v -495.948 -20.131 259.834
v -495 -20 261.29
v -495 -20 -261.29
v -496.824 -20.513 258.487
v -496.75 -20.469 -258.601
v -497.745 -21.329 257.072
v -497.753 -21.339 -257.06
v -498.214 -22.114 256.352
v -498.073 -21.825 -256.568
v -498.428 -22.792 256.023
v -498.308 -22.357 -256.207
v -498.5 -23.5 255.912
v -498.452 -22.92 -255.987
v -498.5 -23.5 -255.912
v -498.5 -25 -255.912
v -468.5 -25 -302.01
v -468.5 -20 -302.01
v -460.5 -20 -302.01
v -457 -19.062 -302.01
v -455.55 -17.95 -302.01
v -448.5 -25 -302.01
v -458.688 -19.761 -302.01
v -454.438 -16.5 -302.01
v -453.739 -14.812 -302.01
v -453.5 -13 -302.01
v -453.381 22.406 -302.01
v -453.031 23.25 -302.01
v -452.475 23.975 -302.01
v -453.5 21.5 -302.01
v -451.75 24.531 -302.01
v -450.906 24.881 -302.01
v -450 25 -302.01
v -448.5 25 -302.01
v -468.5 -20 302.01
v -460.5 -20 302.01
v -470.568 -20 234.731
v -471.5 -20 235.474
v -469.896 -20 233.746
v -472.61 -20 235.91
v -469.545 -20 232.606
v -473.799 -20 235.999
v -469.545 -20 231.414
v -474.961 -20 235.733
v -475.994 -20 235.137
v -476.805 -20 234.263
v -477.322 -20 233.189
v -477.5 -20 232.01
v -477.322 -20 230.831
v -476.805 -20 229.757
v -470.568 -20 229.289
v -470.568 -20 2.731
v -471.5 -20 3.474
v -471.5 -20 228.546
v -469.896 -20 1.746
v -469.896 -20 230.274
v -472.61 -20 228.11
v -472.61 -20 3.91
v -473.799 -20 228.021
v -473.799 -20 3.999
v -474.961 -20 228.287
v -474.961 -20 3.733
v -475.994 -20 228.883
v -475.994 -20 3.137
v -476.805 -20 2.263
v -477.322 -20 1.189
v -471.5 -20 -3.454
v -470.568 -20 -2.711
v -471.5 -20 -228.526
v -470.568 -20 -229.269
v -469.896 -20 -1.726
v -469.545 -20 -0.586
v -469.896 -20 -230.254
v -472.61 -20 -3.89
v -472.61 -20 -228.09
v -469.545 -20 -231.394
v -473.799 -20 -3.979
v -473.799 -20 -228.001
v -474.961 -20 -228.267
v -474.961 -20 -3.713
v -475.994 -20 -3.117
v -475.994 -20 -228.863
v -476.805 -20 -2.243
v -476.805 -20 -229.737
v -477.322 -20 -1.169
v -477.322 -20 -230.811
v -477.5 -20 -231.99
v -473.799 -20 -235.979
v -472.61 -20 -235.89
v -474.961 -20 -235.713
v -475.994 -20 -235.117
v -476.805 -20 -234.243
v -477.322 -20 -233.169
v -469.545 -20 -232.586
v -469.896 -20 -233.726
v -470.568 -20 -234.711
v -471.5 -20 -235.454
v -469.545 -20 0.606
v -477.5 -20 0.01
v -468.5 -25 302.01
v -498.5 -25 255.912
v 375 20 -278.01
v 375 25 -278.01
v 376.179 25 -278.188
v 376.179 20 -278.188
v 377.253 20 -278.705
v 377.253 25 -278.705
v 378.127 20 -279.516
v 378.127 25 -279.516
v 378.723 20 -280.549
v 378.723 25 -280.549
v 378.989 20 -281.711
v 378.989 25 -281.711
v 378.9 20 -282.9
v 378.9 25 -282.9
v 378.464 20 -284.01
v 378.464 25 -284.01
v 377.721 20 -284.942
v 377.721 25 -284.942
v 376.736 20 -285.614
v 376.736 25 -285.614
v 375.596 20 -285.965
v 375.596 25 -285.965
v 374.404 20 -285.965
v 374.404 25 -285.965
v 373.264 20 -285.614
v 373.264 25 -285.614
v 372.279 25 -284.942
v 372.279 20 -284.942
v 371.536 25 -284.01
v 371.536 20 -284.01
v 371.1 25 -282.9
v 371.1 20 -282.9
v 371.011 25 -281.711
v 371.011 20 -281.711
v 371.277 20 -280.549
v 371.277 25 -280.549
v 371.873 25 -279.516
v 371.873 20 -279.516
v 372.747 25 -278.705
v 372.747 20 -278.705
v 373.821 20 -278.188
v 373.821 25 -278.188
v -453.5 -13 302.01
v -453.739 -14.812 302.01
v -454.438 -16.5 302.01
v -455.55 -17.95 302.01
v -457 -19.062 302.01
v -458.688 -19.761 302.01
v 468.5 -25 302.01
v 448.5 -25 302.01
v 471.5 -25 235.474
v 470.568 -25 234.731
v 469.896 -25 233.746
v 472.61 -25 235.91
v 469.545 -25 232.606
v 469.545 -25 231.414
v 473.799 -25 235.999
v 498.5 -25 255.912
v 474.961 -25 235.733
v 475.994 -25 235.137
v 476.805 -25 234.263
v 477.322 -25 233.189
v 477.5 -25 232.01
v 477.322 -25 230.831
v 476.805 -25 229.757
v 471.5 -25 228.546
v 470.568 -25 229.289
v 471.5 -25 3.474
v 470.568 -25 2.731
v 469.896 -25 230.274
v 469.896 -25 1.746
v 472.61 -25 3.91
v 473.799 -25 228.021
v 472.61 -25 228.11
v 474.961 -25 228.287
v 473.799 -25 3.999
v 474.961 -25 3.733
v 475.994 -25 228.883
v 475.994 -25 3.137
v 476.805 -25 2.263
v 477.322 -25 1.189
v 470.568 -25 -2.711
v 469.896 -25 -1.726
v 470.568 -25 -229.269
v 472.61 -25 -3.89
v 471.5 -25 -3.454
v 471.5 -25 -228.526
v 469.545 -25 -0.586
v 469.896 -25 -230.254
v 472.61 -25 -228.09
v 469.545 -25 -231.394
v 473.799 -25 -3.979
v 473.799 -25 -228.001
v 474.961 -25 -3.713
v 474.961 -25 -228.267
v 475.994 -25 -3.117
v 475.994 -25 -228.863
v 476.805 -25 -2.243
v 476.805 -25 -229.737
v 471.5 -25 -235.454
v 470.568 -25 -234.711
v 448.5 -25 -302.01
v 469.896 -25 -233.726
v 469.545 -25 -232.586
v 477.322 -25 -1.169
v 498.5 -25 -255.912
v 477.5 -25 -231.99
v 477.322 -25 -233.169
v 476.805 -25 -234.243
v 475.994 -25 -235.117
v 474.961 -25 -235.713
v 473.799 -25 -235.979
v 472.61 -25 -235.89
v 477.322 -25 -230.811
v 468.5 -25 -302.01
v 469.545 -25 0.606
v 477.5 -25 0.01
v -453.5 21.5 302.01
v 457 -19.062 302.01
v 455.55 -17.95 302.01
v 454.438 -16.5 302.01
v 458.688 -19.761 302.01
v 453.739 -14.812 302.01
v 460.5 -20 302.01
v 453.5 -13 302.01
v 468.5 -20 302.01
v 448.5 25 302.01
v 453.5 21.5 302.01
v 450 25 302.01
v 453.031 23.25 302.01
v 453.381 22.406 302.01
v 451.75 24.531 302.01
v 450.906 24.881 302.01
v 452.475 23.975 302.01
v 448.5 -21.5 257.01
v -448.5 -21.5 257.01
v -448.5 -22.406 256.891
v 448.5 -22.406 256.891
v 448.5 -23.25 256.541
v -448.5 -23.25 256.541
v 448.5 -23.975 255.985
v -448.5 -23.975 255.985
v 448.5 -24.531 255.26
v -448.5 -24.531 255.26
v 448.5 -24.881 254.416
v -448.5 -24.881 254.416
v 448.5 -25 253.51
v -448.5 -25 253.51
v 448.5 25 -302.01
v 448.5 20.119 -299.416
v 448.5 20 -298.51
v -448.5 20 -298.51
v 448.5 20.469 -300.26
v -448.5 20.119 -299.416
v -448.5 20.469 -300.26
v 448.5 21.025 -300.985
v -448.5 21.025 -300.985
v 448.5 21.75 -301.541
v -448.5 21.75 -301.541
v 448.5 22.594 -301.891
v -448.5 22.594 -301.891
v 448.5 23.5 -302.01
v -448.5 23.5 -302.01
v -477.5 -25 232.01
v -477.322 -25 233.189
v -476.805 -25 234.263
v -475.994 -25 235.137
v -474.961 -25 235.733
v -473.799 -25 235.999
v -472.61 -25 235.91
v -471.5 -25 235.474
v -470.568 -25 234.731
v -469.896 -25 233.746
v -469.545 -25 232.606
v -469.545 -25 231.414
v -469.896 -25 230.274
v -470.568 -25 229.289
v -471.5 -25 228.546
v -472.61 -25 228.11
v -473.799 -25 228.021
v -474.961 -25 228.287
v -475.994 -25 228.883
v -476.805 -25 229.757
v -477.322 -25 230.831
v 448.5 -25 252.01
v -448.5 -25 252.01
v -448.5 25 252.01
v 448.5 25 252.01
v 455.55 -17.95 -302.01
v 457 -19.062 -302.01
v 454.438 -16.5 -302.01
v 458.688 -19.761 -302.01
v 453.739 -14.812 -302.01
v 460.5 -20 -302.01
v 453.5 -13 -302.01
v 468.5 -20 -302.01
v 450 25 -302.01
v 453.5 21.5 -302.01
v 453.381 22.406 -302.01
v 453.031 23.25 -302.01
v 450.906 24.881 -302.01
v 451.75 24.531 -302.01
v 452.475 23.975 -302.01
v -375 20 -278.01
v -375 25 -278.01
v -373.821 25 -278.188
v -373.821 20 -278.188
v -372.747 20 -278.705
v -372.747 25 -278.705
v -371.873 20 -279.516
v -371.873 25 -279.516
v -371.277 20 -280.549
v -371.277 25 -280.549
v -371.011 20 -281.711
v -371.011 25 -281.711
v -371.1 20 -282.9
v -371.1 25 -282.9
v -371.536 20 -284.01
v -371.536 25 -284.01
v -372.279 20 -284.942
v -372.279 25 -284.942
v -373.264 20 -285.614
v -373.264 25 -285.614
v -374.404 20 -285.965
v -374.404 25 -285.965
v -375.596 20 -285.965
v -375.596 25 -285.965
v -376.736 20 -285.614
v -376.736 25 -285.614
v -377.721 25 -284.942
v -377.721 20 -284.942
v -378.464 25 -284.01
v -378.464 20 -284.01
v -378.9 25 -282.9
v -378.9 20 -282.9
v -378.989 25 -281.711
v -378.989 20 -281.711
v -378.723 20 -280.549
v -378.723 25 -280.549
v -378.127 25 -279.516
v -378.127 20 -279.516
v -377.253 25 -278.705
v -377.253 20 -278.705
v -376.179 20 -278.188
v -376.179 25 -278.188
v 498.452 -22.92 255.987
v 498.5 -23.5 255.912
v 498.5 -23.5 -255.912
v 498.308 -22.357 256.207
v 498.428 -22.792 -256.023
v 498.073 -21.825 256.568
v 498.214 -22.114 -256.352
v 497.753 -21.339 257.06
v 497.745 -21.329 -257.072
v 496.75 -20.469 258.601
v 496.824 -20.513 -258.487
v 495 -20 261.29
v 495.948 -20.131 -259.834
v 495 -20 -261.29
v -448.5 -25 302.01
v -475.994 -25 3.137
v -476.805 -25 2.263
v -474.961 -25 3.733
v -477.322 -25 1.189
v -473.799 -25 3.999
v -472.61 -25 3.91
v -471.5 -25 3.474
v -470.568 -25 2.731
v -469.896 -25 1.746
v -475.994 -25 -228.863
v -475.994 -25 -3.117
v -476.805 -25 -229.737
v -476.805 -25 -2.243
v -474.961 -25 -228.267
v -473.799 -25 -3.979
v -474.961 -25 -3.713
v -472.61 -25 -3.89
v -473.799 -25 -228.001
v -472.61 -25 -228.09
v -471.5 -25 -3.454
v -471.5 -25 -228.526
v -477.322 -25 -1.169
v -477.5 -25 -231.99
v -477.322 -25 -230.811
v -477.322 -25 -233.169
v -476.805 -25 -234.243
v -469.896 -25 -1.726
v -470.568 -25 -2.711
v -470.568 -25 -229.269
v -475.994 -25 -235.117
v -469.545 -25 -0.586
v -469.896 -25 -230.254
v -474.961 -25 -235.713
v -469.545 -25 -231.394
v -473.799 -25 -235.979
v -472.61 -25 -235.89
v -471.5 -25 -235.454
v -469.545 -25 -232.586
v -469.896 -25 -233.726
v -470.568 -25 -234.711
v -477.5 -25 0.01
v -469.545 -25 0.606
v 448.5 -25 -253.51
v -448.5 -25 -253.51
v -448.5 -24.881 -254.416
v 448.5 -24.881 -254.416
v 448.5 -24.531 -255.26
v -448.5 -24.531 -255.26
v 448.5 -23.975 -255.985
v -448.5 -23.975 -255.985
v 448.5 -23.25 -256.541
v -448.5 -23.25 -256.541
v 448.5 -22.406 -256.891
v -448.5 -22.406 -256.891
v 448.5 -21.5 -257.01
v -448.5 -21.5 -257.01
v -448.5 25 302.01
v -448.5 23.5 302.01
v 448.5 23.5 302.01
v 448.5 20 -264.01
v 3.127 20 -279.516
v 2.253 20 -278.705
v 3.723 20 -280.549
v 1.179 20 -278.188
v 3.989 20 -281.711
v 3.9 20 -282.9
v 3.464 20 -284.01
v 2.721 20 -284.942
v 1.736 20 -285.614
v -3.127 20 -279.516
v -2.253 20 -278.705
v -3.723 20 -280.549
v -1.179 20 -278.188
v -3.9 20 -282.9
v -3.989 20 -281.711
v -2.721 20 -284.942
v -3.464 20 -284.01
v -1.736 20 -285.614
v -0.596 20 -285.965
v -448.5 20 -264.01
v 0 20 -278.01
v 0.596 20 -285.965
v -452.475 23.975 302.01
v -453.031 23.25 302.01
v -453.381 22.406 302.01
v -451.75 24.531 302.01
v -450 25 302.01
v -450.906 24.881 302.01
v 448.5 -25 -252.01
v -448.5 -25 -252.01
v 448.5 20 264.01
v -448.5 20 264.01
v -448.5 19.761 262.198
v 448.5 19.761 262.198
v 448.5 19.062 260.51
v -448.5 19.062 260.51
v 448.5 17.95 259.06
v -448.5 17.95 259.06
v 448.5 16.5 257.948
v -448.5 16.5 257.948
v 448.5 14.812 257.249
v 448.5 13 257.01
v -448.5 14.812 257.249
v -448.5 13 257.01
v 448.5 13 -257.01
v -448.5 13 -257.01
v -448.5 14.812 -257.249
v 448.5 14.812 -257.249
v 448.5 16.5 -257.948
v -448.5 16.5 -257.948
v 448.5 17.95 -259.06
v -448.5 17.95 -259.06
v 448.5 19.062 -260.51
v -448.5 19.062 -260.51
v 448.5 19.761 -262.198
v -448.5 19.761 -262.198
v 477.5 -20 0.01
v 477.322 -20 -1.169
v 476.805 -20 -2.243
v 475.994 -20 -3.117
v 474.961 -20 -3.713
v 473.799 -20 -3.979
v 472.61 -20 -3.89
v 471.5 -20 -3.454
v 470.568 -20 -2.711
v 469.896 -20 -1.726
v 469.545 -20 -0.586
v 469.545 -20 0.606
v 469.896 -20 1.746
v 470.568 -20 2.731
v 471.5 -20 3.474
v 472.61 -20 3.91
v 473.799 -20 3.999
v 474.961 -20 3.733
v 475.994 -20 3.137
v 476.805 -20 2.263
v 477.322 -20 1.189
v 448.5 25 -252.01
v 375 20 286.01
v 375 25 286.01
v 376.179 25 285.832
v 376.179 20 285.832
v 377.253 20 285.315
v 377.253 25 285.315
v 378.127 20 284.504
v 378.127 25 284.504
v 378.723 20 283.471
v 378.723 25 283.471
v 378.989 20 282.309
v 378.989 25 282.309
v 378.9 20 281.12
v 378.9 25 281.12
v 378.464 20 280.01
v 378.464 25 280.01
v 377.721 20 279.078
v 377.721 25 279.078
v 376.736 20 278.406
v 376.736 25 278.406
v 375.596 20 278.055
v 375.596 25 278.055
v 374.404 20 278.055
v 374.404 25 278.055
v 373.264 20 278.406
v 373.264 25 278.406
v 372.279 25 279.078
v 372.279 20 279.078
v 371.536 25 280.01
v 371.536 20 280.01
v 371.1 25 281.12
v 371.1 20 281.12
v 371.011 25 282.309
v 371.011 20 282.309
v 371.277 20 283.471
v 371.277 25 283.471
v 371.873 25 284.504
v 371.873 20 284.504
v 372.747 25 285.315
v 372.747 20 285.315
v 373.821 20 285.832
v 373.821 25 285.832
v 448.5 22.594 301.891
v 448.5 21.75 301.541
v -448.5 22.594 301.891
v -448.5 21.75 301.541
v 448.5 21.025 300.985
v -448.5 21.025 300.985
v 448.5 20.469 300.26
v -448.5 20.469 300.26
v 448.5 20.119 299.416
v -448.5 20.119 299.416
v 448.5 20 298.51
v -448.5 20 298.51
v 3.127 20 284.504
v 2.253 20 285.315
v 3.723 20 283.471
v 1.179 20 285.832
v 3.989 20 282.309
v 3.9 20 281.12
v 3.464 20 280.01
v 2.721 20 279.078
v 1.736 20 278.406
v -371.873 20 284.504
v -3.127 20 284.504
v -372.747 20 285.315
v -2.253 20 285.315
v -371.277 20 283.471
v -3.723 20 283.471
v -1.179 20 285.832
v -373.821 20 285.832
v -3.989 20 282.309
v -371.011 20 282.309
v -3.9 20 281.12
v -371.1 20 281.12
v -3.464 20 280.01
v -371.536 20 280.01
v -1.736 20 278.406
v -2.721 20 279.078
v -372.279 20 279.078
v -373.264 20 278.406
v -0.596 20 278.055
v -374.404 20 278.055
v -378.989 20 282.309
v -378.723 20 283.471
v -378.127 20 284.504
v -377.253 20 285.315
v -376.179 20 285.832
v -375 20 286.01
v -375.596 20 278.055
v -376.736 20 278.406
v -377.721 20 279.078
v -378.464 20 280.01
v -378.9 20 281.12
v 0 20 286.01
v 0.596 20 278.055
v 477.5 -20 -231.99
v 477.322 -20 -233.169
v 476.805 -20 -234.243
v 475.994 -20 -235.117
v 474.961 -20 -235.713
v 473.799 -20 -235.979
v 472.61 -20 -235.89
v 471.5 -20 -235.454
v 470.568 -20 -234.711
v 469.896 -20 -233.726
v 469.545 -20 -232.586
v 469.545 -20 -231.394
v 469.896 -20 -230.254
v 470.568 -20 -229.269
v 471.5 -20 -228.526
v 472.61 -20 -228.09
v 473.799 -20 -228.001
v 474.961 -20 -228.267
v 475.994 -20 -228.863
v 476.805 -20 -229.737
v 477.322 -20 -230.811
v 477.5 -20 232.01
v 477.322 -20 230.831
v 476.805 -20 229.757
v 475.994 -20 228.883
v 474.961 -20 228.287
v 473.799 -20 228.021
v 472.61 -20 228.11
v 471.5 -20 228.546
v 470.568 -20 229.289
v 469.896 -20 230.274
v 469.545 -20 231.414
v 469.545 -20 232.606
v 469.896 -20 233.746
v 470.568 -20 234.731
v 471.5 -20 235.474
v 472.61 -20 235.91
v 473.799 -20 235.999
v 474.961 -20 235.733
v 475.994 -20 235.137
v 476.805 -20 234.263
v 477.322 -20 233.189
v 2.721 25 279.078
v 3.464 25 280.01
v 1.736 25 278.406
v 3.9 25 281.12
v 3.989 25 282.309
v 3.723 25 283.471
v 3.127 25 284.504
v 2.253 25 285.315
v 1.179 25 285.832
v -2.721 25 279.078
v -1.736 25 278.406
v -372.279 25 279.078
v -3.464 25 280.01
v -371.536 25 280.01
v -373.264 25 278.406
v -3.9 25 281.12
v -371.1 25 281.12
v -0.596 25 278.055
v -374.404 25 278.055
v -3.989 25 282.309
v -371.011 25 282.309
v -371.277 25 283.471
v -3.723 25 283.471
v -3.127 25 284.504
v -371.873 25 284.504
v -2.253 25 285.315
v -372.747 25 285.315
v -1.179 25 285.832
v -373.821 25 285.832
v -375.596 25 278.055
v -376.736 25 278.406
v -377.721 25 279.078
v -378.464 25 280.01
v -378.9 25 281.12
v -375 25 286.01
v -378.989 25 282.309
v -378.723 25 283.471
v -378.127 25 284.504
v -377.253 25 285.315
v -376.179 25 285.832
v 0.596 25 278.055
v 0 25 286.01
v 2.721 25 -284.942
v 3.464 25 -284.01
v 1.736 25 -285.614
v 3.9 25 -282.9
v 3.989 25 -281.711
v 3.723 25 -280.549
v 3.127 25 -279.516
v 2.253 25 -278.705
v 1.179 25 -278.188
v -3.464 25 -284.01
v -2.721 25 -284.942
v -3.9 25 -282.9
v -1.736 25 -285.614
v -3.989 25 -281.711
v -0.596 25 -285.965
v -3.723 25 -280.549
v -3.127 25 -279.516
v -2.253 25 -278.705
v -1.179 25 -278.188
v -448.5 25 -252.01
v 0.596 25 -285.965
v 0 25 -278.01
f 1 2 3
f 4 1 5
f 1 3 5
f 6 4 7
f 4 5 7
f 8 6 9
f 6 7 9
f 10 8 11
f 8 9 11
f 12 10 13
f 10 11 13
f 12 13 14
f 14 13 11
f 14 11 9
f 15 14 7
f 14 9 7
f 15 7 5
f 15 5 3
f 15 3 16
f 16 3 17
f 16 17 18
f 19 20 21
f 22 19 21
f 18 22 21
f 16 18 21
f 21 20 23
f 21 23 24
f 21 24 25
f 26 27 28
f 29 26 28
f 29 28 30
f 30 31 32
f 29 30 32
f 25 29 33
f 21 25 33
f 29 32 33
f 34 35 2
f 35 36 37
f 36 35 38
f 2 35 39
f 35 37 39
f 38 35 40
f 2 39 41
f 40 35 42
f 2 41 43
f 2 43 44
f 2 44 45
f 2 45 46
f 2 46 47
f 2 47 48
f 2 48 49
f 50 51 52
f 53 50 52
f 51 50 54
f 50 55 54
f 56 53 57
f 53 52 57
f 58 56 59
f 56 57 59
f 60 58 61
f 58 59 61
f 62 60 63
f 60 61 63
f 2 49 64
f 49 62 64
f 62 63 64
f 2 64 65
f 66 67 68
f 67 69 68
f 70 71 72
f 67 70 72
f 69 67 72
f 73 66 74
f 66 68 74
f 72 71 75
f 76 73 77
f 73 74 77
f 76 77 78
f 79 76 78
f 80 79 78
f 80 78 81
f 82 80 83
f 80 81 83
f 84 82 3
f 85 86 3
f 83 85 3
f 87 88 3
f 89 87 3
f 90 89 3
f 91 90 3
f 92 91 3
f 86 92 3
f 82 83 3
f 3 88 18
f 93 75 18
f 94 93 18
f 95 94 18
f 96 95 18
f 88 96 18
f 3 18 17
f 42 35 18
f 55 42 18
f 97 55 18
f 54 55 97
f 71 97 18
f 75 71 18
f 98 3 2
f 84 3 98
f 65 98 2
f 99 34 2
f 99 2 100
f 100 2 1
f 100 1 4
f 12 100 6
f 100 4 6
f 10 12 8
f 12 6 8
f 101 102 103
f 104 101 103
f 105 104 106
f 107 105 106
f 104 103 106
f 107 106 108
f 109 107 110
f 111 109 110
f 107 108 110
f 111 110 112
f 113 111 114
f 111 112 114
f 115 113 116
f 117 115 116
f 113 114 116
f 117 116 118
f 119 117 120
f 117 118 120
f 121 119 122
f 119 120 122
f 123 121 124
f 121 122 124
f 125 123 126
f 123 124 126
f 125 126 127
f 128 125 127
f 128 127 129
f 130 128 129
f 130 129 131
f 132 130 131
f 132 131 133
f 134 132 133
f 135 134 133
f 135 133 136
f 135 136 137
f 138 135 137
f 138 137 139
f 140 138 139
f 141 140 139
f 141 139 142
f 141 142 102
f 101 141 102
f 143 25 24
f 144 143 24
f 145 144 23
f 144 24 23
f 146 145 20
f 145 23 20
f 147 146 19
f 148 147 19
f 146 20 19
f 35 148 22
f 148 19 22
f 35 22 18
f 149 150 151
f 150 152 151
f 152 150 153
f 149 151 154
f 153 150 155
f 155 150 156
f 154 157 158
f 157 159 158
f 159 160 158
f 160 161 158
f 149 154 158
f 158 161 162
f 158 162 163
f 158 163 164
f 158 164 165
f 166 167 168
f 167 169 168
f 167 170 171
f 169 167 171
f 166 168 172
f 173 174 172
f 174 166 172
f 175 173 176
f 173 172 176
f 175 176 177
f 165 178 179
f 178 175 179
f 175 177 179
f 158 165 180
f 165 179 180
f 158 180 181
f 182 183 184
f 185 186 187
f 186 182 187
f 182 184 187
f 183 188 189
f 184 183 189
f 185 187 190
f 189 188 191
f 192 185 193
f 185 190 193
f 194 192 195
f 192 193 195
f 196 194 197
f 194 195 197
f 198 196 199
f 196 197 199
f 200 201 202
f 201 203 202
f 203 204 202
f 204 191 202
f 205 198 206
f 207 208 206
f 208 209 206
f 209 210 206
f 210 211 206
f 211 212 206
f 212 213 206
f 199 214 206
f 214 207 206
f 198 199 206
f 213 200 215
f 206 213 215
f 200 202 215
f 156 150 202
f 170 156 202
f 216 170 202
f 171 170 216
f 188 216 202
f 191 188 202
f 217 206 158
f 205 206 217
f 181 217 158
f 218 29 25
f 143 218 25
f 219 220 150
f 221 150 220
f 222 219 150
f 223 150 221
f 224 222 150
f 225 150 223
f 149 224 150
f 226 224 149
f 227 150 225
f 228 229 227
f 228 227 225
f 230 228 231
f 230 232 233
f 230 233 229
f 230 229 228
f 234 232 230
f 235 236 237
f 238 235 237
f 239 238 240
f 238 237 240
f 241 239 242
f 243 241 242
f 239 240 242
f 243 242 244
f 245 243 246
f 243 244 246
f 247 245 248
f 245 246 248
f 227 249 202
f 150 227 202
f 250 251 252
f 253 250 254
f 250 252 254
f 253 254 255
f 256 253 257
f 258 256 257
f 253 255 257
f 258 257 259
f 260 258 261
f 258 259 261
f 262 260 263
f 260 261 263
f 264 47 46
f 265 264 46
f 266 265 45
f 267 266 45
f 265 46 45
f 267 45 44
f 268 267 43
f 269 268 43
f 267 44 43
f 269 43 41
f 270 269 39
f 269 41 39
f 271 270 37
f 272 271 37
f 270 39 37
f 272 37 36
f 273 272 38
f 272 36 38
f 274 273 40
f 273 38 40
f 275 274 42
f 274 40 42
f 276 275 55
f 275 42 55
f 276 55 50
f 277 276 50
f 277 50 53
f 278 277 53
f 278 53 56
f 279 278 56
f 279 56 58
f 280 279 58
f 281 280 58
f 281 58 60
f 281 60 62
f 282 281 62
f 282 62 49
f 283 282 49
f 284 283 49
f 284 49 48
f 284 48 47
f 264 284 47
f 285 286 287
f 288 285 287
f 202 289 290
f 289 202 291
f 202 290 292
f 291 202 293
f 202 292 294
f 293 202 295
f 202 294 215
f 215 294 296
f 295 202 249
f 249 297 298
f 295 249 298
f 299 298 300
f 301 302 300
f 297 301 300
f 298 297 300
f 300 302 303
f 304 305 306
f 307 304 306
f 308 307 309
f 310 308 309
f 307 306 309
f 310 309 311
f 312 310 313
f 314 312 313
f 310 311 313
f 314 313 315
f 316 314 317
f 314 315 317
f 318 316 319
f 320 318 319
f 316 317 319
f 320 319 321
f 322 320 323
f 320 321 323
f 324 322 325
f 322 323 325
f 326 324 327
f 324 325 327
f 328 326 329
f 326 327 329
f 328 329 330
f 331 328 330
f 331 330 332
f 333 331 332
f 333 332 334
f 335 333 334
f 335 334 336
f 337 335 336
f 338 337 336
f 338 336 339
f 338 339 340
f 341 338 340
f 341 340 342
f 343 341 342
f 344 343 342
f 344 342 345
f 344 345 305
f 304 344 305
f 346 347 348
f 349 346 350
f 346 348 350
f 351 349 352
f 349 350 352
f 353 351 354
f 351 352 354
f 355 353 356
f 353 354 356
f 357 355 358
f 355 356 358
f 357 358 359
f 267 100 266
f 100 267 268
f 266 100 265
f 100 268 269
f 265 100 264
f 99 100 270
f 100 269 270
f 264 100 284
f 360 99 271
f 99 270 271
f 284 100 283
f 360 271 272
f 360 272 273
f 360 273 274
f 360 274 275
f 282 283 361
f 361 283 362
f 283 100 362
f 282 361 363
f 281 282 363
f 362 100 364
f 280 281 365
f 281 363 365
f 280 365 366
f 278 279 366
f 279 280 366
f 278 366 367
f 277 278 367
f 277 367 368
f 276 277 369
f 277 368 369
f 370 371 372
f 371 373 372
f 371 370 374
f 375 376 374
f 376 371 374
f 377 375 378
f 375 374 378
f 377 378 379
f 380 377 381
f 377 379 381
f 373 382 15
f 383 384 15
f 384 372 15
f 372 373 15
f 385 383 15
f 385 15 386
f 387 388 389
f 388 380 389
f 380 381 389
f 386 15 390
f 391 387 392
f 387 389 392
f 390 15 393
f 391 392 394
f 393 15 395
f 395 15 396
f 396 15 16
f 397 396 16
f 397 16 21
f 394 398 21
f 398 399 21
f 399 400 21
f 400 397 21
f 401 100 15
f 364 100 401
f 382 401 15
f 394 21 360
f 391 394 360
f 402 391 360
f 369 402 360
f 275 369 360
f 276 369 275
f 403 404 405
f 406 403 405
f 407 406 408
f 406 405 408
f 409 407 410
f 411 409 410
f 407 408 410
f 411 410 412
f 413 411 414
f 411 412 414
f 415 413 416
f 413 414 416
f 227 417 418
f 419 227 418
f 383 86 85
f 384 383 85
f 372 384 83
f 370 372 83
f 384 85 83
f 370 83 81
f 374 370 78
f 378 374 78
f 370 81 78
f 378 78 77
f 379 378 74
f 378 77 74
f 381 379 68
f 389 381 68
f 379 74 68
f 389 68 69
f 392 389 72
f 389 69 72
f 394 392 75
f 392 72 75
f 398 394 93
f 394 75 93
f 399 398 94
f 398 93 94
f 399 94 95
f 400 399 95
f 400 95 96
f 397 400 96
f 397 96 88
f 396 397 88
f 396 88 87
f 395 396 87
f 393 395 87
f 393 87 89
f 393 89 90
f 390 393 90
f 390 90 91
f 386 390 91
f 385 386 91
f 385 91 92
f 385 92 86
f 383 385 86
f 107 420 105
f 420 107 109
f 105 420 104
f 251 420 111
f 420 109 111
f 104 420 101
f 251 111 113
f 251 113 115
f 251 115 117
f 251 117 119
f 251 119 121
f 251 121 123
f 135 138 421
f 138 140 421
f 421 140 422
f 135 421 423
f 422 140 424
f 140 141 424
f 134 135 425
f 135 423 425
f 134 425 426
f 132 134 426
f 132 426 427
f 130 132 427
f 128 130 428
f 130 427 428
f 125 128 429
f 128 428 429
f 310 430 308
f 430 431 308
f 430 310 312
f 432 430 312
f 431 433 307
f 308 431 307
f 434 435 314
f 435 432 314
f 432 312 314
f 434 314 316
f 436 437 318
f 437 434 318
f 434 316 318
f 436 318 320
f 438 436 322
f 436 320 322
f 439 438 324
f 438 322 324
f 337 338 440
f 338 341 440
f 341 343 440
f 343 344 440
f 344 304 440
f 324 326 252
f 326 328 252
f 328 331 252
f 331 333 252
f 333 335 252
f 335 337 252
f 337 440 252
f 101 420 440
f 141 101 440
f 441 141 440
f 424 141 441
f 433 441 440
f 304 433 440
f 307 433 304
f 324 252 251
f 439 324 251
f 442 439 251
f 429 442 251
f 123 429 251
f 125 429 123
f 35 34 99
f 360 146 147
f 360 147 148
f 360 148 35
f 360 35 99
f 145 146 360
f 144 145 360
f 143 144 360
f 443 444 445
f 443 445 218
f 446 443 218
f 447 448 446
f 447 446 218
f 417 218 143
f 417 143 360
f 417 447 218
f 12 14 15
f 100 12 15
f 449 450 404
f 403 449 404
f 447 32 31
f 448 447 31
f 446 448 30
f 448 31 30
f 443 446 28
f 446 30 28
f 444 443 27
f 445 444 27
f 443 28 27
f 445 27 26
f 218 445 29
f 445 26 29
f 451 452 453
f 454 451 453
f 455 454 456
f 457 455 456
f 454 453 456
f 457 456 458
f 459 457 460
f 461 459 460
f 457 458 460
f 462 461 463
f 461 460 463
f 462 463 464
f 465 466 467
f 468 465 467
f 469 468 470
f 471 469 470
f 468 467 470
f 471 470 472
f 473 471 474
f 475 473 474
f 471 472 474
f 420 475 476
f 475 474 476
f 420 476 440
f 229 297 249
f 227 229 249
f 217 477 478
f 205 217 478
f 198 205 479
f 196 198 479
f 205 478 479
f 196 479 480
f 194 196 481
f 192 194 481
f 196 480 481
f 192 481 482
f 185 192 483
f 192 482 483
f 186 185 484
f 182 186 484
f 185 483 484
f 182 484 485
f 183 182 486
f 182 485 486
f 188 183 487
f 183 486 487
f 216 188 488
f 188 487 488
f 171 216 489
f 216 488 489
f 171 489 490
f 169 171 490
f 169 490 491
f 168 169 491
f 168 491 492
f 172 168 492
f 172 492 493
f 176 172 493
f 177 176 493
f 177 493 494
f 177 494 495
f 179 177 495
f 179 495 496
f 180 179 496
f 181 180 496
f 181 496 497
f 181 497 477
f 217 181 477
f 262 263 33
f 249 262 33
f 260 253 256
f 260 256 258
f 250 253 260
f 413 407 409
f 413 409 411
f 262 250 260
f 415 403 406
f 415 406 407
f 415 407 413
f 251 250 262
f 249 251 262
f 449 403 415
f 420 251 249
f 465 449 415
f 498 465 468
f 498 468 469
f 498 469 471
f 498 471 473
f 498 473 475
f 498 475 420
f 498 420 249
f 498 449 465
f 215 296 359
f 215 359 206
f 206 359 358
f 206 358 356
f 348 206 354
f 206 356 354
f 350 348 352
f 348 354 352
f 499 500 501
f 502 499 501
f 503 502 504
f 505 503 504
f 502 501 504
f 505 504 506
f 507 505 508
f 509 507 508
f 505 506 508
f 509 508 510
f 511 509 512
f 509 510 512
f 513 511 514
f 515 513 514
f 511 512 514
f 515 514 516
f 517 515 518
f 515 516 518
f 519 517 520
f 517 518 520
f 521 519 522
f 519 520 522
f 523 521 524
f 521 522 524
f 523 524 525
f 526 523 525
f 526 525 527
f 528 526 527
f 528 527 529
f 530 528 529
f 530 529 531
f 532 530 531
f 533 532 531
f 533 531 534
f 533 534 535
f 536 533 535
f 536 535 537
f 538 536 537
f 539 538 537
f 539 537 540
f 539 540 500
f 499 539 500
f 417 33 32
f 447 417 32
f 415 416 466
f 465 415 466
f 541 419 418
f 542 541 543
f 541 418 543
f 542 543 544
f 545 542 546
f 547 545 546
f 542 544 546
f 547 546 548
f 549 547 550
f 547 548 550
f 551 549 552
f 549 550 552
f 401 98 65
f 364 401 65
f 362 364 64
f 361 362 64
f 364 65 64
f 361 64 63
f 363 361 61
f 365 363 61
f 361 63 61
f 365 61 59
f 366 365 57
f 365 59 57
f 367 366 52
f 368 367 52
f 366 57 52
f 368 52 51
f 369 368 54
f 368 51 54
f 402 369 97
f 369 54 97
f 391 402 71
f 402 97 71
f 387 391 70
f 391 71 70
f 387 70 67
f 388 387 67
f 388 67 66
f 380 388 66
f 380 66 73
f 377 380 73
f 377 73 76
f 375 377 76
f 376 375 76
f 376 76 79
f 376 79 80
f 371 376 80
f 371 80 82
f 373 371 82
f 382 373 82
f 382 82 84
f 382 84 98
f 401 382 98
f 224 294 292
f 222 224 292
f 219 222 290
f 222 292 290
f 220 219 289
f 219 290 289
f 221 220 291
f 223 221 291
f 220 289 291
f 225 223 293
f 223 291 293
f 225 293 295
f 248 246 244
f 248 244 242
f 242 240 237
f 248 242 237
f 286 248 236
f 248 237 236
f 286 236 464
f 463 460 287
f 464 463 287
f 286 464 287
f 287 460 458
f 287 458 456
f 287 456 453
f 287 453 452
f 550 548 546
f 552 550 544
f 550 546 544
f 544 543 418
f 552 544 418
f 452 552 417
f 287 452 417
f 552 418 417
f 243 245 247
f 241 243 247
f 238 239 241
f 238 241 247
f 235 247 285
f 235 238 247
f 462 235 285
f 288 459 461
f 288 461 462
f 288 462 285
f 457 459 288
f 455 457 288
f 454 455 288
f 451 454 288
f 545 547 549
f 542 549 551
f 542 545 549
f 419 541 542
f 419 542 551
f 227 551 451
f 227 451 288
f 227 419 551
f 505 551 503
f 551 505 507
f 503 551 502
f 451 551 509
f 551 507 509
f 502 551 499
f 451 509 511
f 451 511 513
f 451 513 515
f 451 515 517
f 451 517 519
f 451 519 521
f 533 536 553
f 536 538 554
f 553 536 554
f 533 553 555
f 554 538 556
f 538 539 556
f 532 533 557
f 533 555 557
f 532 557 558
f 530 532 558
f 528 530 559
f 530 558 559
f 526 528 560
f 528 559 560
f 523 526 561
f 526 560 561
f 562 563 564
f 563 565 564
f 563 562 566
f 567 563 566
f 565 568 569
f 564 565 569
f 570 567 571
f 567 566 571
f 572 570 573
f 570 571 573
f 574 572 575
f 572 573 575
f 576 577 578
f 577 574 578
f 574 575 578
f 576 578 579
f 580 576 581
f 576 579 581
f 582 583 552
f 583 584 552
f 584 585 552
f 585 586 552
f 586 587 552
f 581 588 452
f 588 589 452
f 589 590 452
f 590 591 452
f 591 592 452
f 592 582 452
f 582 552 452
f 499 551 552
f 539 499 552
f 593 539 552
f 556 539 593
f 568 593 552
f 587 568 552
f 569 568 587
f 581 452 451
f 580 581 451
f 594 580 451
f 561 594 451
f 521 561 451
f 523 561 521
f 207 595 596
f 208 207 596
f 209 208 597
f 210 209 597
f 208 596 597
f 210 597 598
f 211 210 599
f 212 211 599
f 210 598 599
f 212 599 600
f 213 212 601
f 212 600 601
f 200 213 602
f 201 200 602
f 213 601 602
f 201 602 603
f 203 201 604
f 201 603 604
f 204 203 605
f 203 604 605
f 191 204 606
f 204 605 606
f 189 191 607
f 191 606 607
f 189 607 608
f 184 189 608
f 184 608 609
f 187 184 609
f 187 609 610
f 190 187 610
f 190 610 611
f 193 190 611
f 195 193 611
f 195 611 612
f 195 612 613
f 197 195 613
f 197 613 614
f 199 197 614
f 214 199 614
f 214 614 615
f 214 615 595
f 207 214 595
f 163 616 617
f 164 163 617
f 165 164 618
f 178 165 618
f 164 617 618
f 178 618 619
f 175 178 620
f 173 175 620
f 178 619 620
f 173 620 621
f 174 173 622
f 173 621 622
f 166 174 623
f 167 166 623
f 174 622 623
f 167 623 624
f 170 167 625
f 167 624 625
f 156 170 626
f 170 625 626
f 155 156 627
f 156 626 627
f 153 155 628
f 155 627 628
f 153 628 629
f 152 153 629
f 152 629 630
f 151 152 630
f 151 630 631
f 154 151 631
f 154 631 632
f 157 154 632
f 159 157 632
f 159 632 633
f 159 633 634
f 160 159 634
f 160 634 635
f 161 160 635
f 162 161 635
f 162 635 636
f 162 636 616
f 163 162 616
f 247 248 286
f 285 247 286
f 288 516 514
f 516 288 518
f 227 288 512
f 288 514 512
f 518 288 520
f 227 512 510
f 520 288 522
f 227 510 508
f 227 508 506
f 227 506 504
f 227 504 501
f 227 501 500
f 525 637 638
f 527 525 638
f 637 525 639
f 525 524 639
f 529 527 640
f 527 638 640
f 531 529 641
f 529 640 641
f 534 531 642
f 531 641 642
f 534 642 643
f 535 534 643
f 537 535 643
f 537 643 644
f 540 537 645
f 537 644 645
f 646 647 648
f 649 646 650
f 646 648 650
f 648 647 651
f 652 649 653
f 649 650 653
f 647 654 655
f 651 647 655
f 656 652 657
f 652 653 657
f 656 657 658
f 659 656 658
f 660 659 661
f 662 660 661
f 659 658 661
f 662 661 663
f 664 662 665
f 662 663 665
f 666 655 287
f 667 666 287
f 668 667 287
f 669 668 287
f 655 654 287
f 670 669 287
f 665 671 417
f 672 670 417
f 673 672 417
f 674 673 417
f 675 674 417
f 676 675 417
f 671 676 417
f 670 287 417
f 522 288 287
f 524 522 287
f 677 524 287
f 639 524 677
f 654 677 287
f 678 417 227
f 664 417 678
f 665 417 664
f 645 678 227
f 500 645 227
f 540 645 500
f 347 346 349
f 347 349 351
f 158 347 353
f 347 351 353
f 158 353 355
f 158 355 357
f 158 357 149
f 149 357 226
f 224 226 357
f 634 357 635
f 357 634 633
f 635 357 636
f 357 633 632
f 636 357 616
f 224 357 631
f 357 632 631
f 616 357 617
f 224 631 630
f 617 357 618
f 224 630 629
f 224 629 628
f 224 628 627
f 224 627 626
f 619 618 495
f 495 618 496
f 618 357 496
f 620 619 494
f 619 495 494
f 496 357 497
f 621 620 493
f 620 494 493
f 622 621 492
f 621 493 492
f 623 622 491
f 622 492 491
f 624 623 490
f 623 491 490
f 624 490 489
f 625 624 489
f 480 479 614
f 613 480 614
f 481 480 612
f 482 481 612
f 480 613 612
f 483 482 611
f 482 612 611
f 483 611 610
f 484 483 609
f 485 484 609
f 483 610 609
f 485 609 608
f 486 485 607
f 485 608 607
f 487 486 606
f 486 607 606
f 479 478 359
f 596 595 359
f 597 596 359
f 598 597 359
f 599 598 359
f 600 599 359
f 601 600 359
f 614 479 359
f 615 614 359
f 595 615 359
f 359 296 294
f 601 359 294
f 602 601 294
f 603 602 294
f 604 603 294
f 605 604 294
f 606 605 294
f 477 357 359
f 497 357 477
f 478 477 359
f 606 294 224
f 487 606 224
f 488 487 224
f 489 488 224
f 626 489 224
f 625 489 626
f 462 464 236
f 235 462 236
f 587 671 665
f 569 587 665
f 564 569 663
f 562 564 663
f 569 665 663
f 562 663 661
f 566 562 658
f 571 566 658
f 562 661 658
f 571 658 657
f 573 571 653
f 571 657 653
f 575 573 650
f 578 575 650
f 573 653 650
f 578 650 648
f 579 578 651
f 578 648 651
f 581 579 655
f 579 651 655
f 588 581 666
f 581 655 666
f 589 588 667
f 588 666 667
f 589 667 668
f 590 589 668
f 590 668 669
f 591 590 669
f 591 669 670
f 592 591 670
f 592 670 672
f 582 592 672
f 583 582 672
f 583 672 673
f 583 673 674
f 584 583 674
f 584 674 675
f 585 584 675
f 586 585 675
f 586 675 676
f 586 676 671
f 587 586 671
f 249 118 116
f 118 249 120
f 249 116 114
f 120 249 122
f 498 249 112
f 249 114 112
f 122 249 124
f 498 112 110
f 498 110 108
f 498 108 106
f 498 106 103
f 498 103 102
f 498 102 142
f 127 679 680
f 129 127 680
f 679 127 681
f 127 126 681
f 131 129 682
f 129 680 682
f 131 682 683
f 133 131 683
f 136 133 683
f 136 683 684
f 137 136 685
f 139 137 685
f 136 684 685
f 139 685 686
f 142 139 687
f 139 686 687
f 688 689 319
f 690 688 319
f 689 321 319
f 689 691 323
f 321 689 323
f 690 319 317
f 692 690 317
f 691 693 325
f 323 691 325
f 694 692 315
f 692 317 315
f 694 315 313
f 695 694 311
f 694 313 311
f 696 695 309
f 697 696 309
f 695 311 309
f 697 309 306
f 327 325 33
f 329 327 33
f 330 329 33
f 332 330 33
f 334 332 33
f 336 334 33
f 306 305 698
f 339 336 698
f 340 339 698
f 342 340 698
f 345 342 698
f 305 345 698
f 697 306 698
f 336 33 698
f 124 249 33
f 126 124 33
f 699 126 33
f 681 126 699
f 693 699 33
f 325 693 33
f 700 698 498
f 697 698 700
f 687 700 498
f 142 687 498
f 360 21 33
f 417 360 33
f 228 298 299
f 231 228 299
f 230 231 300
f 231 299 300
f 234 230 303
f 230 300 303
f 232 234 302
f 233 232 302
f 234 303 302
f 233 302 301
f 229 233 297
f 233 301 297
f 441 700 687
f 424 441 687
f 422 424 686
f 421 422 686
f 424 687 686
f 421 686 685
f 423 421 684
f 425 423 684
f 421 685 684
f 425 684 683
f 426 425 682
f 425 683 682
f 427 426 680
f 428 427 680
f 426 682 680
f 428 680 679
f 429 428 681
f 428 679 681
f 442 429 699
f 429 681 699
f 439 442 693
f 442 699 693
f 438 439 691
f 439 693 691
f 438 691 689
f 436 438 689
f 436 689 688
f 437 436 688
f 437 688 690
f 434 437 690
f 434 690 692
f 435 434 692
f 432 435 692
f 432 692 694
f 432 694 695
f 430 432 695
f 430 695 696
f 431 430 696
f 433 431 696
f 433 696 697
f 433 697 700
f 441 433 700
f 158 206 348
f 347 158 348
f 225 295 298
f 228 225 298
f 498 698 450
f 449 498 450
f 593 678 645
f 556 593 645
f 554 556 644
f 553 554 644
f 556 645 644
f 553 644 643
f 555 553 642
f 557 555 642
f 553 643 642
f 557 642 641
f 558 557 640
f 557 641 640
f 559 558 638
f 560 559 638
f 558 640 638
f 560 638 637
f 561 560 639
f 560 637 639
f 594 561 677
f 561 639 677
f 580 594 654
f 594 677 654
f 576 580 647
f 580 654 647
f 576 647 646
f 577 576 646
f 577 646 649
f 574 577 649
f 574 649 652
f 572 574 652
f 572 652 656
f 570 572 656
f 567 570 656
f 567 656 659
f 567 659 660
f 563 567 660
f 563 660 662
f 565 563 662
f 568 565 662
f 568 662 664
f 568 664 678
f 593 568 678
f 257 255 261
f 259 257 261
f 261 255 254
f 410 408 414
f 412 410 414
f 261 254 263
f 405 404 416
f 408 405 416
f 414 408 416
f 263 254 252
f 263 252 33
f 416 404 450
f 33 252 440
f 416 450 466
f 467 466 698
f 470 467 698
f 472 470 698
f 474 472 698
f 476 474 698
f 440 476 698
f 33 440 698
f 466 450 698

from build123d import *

# Parameters (mm, degrees)
L_START                    = -448.5
L_ANGLE_L50X50X5_1_DEPTH   = 897
L_START_2                  = -302.01
L_ANGLE_L50X50X5_1_2_DEPTH = 604.02
CUT_EXTRUDE1_DEPTH         = 585.583005312
SKETCH13_R                 = 4
CUT_EXTRUDE2_DEPTH         = 585.583005312
SKETCH14_R                 = 4
CUT_EXTRUDE3_DEPTH         = 10


# Read off the part's stored shape, not the designer's step: L angle L50X50X5(1)
with BuildPart() as part:
    # L angle L50X50X5(1) outline → L angle L50X50X5(1) (new body)
    with BuildSketch(Plane.YZ.offset(L_START)):
        with BuildLine():
            Line((25, 252.01), (25, 302.01))
            Line((25, 302.01), (23.5, 302.01))
            ThreePointArc((23.5, 302.01), (21.025126266, 300.984873734), (20, 298.51))
            Line((20, 298.51), (20, 264.01))
            ThreePointArc((20, 264.01), (17.949747468, 259.060252532), (13, 257.01))
            Line((13, 257.01), (-21.5, 257.01))
            ThreePointArc((-21.5, 257.01), (-23.974873734, 255.984873734), (-25, 253.51))
            Line((-25, 253.51), (-25, 252.01))
            Line((-25, 252.01), (25, 252.01))
        make_face()
        with BuildLine():
            Line((25, -252.01), (-25, -252.01))
            Line((-25, -252.01), (-25, -253.51))
            ThreePointArc((-25, -253.51), (-23.974873734, -255.984873734), (-21.5, -257.01))
            Line((-21.5, -257.01), (13, -257.01))
            ThreePointArc((13, -257.01), (17.949747468, -259.060252532), (20, -264.01))
            Line((20, -264.01), (20, -298.51))
            ThreePointArc((20, -298.51), (21.025126266, -300.984873734), (23.5, -302.01))
            Line((23.5, -302.01), (25, -302.01))
            Line((25, -302.01), (25, -252.01))
        make_face()
    extrude(amount=L_ANGLE_L50X50X5_1_DEPTH)

    # Sketch14 → Cut-Extrude3 (cut)
    with BuildSketch(Plane(origin=(0, 25, 0), x_dir=(1, 0, 0), z_dir=(0, 1, 0))):
        with Locations(Location((375, 282.01, 0), (0, 0, 270))):
            Circle(SKETCH14_R)
        with Locations(Location((0, 282.01, 0), (0, 0, 270))):
            Circle(SKETCH14_R)
        with Locations(Location((-375, 282.01, 0), (0, 0, 270))):
            Circle(SKETCH14_R)
        with Locations(Location((-375, -282.01, 0), (0, 0, 270))):
            Circle(SKETCH14_R)
        with Locations(Location((0, -282.01, 0), (0, 0, 270))):
            Circle(SKETCH14_R)
        with Locations(Location((375, -282.01, 0), (0, 0, 270))):
            Circle(SKETCH14_R)
    extrude(amount=-CUT_EXTRUDE3_DEPTH, mode=Mode.SUBTRACT)


with BuildPart() as body_2:
    # L angle L50X50X5_1 2 outline → L angle L50X50X5_1 2 (new body)
    with BuildSketch(Plane.XY.offset(L_START_2)):
        with BuildLine():
            Line((448.5, -25), (498.5, -25))
            Line((498.5, -25), (498.5, -23.5))
            ThreePointArc((498.5, -23.5), (497.474873734, -21.025126266), (495, -20))
            Line((495, -20), (460.5, -20))
            ThreePointArc((460.5, -20), (455.550252532, -17.949747468), (453.5, -13))
            Line((453.5, -13), (453.5, 21.5))
            ThreePointArc((453.5, 21.5), (452.474873734, 23.974873734), (450, 25))
            Line((450, 25), (448.5, 25))
            Line((448.5, 25), (448.5, -25))
        make_face()
        with BuildLine():
            Line((-448.5, -25), (-448.5, 25))
            Line((-448.5, 25), (-450, 25))
            ThreePointArc((-450, 25), (-452.474873734, 23.974873734), (-453.5, 21.5))
            Line((-453.5, 21.5), (-453.5, -13))
            ThreePointArc((-453.5, -13), (-455.550252532, -17.949747468), (-460.5, -20))
            Line((-460.5, -20), (-495, -20))
            ThreePointArc((-495, -20), (-497.474873734, -21.025126266), (-498.5, -23.5))
            Line((-498.5, -23.5), (-498.5, -25))
            Line((-498.5, -25), (-448.5, -25))
        make_face()
    extrude(amount=L_ANGLE_L50X50X5_1_2_DEPTH)

    # Sketch12 → Cut-Extrude1 (cut, through all)
    with BuildSketch(Plane(origin=(0, -20, 0), x_dir=(1, 0, 0), z_dir=(0, 1, 0))):
        Polygon((-468.5, -302.01), (-500.831260031, -252.33008513), (-500.831260031, -302.01), align=None)
        Polygon((-500.831260031, 302.01), (-500.831260031, 252.33008513), (-468.5, 302.01), align=None)
        Polygon((468.5, 302.01), (500.831260031, 252.33008513), (500.831260031, 302.01), align=None)
        Polygon((500.831260031, -302.01), (500.831260031, -252.33008513), (468.5, -302.01), align=None)
    extrude(amount=-CUT_EXTRUDE1_DEPTH, mode=Mode.SUBTRACT)

    # Sketch13 → Cut-Extrude2 (cut, through all)
    with BuildSketch(Plane(origin=(0, -20, 0), x_dir=(1, 0, 0), z_dir=(0, 1, 0))):
        with Locations(Location((-473.5, -232.01, 0), (0, 0, 180))):
            Circle(SKETCH13_R)
        with Locations(Location((-473.5, -0.01, 0), (0, 0, 180))):
            Circle(SKETCH13_R)
        with Locations(Location((-473.5, 231.99, 0), (0, 0, 180))):
            Circle(SKETCH13_R)
        with Locations((473.5, 231.99)):
            Circle(SKETCH13_R)
        with Locations((473.5, -0.01)):
            Circle(SKETCH13_R)
        with Locations((473.5, -232.01)):
            Circle(SKETCH13_R)
    extrude(amount=-CUT_EXTRUDE2_DEPTH, mode=Mode.SUBTRACT)


solid = Compound([part.part, body_2.part])
